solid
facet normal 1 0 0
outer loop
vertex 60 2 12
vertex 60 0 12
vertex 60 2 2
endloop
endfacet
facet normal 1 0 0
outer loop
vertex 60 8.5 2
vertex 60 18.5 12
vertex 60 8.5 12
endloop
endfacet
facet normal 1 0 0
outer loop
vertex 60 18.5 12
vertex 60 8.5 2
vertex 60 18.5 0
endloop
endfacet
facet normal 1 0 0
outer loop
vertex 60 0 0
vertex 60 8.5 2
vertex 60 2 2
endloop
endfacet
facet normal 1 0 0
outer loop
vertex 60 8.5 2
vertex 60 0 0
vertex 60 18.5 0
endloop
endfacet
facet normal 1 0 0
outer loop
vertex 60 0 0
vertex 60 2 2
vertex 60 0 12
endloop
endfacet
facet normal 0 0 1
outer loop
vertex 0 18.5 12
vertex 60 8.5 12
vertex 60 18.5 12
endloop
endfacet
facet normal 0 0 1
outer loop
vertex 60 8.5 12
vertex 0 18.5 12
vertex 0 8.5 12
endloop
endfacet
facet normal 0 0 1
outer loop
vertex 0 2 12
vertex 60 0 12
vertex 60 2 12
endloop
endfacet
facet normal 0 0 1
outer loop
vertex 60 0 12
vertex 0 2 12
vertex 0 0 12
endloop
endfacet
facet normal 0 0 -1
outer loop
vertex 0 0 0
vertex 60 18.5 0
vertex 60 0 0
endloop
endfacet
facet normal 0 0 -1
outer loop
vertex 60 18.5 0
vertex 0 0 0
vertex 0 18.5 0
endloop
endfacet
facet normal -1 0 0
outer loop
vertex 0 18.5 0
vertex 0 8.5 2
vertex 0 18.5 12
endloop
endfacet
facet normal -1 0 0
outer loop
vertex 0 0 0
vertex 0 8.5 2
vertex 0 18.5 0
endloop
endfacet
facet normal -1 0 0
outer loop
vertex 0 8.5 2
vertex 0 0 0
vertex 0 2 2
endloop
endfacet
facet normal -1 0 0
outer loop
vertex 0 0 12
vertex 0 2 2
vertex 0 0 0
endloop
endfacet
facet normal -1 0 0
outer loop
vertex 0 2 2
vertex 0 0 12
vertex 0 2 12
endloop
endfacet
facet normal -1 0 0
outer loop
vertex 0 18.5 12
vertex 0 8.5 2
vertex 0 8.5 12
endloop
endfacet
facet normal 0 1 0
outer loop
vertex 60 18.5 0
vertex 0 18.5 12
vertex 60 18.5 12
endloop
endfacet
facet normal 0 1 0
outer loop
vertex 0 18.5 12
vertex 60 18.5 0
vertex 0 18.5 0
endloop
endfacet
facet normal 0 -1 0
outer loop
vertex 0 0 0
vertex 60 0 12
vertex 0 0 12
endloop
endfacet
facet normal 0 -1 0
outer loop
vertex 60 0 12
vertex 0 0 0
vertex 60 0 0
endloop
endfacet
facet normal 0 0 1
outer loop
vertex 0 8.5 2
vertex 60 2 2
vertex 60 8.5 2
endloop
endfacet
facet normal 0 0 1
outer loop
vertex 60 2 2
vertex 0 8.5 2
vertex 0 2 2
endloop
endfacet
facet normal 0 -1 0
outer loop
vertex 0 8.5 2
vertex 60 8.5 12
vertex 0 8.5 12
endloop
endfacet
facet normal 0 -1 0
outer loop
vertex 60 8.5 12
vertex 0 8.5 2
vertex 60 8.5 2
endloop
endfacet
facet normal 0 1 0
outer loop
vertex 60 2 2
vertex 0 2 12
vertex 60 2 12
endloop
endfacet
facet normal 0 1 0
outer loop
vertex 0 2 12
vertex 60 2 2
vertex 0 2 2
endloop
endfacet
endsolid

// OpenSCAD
thick = 2;
boardD = 6.5;

W = 60;
D = 10 + boardD + thick;
H = 10 + thick;

difference() {
    cube([W, D, H]);
    translate([0, thick, thick])
        cube([W, boardD, H - thick]);
}
